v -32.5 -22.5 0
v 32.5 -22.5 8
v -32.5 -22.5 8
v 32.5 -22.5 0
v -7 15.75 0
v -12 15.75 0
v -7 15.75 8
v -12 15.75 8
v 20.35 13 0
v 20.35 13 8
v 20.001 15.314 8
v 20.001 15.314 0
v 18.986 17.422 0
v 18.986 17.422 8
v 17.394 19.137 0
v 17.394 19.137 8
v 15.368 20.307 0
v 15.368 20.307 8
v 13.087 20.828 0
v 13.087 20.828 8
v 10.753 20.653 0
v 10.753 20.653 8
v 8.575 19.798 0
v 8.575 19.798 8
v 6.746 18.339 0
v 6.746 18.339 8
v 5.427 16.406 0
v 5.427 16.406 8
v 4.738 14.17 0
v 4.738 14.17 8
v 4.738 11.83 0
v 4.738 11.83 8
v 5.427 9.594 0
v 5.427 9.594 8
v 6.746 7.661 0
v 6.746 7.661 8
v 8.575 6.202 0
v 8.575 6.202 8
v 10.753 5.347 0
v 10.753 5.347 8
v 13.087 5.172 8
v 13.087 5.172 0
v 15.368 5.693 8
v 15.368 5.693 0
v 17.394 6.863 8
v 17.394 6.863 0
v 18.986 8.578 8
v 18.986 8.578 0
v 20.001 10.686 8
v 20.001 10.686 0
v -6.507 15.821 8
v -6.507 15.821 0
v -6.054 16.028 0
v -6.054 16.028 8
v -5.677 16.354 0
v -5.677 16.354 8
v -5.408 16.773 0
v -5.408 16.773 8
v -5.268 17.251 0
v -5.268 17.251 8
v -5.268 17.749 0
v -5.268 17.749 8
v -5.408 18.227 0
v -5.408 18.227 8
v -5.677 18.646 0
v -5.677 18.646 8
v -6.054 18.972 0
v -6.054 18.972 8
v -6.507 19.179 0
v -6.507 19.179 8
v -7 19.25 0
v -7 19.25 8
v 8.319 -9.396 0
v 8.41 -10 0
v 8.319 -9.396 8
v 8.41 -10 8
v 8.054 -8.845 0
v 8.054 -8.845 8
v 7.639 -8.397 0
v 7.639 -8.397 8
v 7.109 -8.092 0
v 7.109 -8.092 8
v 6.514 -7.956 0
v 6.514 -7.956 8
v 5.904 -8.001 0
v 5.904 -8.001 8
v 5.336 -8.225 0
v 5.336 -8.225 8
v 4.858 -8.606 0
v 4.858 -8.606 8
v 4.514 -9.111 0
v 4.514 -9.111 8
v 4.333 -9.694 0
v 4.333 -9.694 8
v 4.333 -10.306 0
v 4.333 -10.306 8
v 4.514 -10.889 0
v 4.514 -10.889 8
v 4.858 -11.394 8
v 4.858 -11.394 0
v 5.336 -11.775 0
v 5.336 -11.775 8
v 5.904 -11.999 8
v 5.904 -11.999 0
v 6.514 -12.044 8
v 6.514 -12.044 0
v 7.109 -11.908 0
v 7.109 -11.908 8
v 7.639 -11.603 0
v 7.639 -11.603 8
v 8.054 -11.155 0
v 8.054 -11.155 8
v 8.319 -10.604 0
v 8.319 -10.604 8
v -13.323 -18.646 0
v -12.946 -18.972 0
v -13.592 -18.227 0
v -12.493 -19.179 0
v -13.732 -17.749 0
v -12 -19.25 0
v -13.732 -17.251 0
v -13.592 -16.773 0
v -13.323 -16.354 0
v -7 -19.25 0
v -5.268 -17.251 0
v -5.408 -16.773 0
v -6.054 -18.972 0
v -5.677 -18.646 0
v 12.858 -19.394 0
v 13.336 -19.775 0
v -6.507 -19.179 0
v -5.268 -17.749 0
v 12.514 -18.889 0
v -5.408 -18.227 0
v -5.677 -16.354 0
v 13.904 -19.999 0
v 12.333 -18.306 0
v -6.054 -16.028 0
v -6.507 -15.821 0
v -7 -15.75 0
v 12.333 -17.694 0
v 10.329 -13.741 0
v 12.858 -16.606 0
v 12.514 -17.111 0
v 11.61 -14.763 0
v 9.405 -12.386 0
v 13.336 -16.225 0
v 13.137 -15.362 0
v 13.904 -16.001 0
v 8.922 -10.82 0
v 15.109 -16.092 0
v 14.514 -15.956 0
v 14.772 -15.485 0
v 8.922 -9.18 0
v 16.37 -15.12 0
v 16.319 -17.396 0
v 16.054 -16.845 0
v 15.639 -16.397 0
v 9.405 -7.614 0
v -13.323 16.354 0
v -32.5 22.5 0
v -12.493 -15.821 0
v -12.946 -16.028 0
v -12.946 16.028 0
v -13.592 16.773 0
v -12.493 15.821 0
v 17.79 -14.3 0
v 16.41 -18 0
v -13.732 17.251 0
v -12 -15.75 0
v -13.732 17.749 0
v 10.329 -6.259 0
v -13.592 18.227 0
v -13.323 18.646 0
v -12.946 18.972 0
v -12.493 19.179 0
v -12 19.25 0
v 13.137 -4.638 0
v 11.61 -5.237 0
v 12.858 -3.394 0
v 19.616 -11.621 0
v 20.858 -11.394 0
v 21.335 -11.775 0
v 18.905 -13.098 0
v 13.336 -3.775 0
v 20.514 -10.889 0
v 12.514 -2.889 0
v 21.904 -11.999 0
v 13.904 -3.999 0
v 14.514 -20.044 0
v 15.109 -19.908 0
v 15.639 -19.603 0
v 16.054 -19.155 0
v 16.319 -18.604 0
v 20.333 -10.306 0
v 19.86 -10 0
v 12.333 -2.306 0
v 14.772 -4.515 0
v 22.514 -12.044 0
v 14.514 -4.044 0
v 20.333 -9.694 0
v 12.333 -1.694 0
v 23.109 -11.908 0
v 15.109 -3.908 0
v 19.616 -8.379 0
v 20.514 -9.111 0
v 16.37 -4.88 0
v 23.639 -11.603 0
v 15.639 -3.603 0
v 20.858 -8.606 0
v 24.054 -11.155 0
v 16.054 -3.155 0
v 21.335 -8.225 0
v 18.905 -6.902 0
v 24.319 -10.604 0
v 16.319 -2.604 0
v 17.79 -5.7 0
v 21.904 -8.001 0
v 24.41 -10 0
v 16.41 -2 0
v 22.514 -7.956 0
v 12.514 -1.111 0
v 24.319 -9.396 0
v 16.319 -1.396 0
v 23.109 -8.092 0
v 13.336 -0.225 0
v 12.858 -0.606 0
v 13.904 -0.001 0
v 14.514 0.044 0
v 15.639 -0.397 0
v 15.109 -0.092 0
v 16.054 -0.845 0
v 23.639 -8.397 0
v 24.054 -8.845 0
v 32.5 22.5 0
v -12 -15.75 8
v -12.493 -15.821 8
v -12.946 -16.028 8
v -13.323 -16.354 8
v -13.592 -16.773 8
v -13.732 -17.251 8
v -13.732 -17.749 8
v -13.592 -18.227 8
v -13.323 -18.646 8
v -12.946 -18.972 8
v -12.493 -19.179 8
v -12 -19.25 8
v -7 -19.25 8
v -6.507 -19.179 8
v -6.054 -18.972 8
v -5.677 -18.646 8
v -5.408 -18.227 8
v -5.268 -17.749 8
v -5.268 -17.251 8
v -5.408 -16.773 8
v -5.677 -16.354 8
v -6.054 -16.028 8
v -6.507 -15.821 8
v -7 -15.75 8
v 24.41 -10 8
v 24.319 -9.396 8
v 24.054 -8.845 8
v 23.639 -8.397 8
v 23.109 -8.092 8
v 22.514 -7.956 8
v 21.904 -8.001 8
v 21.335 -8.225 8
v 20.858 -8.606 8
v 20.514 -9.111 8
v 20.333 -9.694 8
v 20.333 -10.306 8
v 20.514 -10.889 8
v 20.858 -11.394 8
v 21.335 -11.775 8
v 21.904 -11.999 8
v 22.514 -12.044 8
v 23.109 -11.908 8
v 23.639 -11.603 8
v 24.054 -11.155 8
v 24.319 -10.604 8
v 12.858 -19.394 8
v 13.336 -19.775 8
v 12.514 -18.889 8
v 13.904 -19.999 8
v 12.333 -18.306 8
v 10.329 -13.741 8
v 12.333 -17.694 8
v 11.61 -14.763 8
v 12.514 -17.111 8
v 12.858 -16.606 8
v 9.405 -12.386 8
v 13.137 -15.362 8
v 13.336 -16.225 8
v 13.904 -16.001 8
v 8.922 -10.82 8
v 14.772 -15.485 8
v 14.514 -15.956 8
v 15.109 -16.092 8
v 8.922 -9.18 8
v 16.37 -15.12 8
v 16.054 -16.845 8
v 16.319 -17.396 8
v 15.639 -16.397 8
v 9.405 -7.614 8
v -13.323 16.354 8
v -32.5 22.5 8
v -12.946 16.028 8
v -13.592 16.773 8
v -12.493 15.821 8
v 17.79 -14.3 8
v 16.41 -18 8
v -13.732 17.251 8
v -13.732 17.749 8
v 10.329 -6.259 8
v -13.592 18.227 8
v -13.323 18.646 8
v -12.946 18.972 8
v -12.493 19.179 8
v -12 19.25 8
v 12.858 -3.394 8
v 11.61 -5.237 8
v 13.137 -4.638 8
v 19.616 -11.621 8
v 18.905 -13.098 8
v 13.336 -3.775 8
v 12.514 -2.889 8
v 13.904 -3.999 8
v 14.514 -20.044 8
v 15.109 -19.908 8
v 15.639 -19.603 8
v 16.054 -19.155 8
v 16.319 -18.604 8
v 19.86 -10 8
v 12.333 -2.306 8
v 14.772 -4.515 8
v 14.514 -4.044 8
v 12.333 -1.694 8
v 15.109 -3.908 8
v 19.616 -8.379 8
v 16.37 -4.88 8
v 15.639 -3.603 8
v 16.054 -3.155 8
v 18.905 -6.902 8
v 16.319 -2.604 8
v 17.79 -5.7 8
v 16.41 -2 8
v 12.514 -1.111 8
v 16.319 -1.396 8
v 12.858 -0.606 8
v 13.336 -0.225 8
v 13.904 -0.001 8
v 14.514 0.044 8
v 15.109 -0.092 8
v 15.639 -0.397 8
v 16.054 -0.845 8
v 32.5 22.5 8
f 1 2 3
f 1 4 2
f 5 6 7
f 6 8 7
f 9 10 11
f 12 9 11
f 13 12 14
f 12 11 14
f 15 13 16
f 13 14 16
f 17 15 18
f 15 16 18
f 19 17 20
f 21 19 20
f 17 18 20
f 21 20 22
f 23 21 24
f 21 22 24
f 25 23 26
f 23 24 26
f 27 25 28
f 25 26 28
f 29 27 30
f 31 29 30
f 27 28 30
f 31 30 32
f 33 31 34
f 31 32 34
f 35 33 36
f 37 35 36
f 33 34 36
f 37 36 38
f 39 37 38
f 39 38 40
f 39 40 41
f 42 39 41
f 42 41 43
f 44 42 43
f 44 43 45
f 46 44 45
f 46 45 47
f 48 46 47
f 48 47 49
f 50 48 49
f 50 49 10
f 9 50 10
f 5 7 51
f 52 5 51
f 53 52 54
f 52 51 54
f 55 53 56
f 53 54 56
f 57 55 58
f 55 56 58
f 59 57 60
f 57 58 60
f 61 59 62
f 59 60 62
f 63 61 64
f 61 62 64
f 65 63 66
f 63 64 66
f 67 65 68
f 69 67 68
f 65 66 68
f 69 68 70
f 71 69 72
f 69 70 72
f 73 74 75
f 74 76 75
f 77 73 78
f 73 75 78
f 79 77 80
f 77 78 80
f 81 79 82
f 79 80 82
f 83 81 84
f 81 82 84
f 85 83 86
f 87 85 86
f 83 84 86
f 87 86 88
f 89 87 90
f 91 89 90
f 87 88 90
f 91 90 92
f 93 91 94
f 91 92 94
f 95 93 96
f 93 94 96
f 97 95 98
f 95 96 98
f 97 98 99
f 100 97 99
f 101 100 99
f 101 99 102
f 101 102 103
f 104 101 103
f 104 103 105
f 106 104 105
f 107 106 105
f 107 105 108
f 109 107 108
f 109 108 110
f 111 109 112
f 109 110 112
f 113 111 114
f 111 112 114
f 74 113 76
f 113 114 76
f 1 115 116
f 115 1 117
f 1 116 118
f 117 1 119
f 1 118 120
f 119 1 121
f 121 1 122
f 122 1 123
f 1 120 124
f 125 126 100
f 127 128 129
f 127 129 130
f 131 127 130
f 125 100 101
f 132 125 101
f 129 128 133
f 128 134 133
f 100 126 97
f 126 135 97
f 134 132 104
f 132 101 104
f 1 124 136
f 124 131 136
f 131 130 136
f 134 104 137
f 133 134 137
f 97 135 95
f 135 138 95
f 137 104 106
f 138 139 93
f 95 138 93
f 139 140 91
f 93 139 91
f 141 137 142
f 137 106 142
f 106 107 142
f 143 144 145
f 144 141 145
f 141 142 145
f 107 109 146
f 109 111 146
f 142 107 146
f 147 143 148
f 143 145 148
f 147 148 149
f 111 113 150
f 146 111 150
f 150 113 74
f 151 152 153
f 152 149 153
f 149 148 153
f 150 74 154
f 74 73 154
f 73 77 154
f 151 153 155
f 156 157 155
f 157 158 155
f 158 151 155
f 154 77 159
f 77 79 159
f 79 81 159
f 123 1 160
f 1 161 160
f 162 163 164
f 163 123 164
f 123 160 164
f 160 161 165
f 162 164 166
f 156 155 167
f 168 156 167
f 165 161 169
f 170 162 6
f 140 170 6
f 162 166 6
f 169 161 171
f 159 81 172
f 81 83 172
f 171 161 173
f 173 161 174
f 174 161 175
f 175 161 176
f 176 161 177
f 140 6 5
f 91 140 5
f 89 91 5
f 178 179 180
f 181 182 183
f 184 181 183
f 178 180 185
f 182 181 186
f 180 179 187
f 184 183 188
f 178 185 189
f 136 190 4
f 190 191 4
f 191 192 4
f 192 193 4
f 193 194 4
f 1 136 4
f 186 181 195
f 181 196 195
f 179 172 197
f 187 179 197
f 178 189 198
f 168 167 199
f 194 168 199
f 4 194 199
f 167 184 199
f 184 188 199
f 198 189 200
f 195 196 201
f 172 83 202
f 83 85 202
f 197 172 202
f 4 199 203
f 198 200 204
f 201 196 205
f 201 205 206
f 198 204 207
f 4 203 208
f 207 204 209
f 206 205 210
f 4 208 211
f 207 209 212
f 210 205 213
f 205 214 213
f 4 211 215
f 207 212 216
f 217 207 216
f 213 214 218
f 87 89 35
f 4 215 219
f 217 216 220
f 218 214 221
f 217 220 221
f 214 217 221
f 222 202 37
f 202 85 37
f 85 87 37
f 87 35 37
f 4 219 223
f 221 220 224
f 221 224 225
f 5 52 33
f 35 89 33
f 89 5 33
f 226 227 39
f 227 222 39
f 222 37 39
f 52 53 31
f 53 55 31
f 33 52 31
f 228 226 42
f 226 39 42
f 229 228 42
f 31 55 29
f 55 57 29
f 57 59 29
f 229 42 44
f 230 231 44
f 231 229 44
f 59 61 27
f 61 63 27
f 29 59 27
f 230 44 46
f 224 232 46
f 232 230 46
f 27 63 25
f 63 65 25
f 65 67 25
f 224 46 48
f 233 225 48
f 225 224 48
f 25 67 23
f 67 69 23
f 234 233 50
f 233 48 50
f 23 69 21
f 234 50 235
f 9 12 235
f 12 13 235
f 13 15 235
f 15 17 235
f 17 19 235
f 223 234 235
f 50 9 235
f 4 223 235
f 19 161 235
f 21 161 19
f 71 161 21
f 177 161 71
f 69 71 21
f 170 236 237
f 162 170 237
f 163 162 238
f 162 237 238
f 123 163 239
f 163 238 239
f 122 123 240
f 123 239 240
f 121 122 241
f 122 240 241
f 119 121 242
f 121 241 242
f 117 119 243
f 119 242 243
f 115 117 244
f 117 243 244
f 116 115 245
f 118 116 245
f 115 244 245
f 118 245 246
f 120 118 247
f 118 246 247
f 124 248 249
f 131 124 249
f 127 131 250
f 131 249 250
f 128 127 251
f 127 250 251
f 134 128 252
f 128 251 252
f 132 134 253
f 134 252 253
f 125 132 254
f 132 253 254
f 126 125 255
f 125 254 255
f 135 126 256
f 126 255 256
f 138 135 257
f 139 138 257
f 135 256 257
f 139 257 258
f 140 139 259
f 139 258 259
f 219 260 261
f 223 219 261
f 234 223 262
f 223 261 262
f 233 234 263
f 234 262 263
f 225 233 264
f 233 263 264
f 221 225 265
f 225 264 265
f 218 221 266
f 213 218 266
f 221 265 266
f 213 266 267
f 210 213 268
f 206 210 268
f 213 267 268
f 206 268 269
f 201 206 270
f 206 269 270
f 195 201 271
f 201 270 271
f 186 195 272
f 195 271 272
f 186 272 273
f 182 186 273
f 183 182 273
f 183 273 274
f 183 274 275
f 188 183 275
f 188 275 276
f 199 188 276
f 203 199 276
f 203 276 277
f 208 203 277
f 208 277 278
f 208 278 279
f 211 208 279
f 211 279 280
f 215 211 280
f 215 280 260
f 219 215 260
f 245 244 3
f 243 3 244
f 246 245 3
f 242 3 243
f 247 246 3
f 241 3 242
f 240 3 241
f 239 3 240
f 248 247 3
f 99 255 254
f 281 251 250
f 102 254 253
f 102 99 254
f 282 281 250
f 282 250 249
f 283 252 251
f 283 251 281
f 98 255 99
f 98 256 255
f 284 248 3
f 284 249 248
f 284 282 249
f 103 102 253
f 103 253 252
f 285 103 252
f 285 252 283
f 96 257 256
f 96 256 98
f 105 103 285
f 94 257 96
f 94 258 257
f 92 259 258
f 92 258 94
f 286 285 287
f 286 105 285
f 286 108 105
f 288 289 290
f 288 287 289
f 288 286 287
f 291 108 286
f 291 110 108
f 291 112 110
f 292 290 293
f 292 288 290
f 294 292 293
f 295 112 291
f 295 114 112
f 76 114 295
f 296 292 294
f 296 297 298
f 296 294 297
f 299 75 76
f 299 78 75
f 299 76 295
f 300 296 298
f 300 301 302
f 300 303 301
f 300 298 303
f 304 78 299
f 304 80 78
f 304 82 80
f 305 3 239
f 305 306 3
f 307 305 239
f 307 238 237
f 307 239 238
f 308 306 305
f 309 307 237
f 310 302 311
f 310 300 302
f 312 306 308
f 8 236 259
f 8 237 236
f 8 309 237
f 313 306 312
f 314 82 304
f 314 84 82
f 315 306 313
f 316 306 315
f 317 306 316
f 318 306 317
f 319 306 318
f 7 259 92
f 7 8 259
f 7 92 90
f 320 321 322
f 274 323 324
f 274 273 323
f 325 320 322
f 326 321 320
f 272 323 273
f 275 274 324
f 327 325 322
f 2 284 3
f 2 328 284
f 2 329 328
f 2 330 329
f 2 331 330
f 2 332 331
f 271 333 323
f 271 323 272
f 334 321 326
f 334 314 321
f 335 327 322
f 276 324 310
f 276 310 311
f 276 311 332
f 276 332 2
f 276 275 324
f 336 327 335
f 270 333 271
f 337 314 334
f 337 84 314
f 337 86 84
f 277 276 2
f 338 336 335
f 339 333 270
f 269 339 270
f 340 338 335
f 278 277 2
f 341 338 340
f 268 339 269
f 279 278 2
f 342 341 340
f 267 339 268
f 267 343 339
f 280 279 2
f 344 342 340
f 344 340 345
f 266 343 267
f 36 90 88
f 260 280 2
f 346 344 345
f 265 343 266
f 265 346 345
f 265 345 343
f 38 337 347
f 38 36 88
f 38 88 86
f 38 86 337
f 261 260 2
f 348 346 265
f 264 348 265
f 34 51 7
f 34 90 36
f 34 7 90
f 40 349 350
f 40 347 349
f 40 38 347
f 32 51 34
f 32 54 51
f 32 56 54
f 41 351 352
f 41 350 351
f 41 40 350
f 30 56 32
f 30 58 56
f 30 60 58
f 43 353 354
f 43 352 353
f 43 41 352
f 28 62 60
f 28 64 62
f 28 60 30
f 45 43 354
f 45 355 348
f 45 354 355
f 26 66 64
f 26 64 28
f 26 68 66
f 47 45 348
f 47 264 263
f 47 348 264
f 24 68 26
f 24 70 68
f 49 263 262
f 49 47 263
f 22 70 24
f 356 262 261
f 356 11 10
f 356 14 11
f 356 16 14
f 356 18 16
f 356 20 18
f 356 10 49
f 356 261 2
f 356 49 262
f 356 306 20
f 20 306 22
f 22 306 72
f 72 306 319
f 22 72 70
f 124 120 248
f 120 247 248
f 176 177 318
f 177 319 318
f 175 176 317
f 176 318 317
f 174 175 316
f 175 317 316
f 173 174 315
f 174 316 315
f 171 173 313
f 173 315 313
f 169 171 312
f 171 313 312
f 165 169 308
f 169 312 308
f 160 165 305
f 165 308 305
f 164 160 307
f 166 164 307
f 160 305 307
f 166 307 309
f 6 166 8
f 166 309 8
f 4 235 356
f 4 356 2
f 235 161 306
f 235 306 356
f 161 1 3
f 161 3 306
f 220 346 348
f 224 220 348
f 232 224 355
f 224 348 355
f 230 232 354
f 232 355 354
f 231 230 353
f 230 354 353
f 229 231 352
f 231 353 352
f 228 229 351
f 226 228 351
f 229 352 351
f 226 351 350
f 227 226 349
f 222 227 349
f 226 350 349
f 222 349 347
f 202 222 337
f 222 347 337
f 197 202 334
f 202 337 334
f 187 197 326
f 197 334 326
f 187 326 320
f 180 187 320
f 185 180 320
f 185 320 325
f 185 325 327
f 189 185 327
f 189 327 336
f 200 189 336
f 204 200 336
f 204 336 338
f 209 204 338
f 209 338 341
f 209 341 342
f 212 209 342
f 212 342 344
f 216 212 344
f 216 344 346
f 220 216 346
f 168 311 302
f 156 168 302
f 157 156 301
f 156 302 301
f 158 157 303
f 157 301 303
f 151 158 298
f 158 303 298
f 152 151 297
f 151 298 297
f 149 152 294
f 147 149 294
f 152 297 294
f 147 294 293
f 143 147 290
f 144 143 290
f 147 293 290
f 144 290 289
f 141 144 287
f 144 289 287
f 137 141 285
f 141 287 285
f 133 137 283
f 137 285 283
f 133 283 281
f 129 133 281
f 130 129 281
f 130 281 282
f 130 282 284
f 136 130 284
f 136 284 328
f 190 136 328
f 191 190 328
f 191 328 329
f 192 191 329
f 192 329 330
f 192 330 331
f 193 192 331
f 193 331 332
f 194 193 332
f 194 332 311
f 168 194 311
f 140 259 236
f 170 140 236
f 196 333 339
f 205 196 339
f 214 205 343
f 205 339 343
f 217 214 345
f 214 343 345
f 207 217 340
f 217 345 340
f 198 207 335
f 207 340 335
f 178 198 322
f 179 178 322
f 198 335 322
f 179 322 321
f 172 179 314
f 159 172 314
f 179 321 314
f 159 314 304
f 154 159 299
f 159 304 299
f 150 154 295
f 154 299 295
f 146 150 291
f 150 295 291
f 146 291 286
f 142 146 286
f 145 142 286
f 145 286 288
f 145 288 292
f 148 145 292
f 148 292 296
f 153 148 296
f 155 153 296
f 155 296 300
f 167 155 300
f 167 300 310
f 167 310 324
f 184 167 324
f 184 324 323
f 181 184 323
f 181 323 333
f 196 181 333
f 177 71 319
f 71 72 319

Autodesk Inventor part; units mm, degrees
ref_plane "YZ Plane" through (0, 0, 0) normal (1, 0, 0) x (0, 1, 0)
ref_plane "XZ Plane" through (0, 0, 0) normal (0, 1, 0) x (-1, 0, 0)
ref_plane "XY Plane" through (0, 0, 0) normal (0, 0, 1) x (1, 0, 0)
sketch "Sketch1" plane through (0, 0, 0) normal (0, 0, 1) x (1, 0, 0)
  line L0 (-32.5, 22.5) -> (32.5, 22.5)
  line L1 (32.5, 22.5) -> (32.5, -22.5)
  line L2 (32.5, -22.5) -> (-32.5, -22.5)
  line L3 (-32.5, -22.5) -> (-32.5, 22.5)
  point P0 (0, 0)
  point P1 (0, 22.5)
  point P2 (-32.5, 0)
  dimension "d0" = 65
  dimension "d1" = 45
extrude "Extrusion1" add sketch "Sketch1" along normal blind 8
sketch "Sketch3" plane through (0, 0, 8) normal (0, 0, 1) x (1, 0, 0)
  line L0 (-32.5, -22.5) -> (32.5, -22.5) projected
  line L1 (32.5, -22.5) -> (32.5, 22.5) projected
  line L2 (32.5, 22.5) -> (-32.5, 22.5) projected
  line L3 (-32.5, 22.5) -> (-32.5, -22.5) projected
  line L4 (-12, 17.5) -> (-7, 17.5) construction
  line L5 (-12, 15.75) -> (-7, 15.75)
  line L6 (-7, 19.25) -> (-12, 19.25)
  arc A0 (-12, 19.25) -> (-12, 15.75) centre (-12, 17.5) ccw
  arc A1 (-7, 15.75) -> (-7, 19.25) centre (-7, 17.5) ccw
  line L7 (-12, -17.5) -> (-7, -17.5) construction
  line L8 (-12, -19.25) -> (-7, -19.25)
  line L9 (-7, -15.75) -> (-12, -15.75)
  arc A2 (-12, -15.75) -> (-12, -19.25) centre (-12, -17.5) ccw
  arc A3 (-7, -19.25) -> (-7, -15.75) centre (-7, -17.5) ccw
  circle A4 centre (-9.5, -17.5) radius 1.75 projected
  point P0 (0, 0)
  point P1 (-9.5, 17.5)
  point P2 (-9.5, -17.5)
  dimension "d8" = 5
  dimension "d9" = 3.5
  dimension "d10" = 5
  dimension "d16" = 5
  dimension "d17" = 23
  dimension "d18" = 5
  dimension "d36" = 23
extrude "Extrusion3" cut sketch "Sketch3" against normal through all contours A0 L6 A1 L5 | A2 L9 A4 L8 | A4 L9 A3 L8 | A4
sketch "Sketch4" plane through (0, 0, 8) normal (0, 0, 1) x (1, 0, 0)
  circle A0 centre (14.3605, -10) radius 11
  circle A1 centre (6.3605, -10) radius 2.05
  circle A2 centre (14.3605, -2) radius 2.05
  circle A3 centre (22.3605, -10) radius 2.05
  circle A4 centre (14.3605, -18) radius 2.05
  circle A5 centre (14.3605, -10) radius 5.5
  line L0 (32.5, -22.5) -> (32.5, 22.5) projected
  line L1 (-32.5, -22.5) -> (32.5, -22.5) projected
  dimension "d19" = 8
  dimension "d20" = 11
  dimension "d21" = 4.1
  dimension "d22" = 4.1
  dimension "d23" = 4.1
  dimension "d24" = 4.1
  dimension "d25" = 22
  dimension "d26" = 18.1395
  dimension "d27" = 8
  dimension "d28" = 8
  dimension "d29" = 8
  dimension "d30" = 12.5
extrude "Extrusion4" cut sketch "Sketch4" against normal through all contours A1 | A2 | A3 | A4 | A5
sketch "Sketch5" plane through (0, 0, 8) normal (0, 0, 1) x (1, 0, 0)
  circle A0 centre (12.5, 13) radius 7.85
  circle A1 centre (14.3605, -10) radius 5.5 projected
  line L0 (32.5, -22.5) -> (32.5, 22.5) projected
  point P0 (0, 0)
  dimension "d31" = 15.7
  dimension "d32" = 23
  dimension "d33" = 20
extrude "Extrusion5" cut sketch "Sketch5" against normal blind 10 contours A0
equation "\"d18\" = d16"
properties part number "0005-10-003 Actionare seringa" material "Wood (Maple)"
